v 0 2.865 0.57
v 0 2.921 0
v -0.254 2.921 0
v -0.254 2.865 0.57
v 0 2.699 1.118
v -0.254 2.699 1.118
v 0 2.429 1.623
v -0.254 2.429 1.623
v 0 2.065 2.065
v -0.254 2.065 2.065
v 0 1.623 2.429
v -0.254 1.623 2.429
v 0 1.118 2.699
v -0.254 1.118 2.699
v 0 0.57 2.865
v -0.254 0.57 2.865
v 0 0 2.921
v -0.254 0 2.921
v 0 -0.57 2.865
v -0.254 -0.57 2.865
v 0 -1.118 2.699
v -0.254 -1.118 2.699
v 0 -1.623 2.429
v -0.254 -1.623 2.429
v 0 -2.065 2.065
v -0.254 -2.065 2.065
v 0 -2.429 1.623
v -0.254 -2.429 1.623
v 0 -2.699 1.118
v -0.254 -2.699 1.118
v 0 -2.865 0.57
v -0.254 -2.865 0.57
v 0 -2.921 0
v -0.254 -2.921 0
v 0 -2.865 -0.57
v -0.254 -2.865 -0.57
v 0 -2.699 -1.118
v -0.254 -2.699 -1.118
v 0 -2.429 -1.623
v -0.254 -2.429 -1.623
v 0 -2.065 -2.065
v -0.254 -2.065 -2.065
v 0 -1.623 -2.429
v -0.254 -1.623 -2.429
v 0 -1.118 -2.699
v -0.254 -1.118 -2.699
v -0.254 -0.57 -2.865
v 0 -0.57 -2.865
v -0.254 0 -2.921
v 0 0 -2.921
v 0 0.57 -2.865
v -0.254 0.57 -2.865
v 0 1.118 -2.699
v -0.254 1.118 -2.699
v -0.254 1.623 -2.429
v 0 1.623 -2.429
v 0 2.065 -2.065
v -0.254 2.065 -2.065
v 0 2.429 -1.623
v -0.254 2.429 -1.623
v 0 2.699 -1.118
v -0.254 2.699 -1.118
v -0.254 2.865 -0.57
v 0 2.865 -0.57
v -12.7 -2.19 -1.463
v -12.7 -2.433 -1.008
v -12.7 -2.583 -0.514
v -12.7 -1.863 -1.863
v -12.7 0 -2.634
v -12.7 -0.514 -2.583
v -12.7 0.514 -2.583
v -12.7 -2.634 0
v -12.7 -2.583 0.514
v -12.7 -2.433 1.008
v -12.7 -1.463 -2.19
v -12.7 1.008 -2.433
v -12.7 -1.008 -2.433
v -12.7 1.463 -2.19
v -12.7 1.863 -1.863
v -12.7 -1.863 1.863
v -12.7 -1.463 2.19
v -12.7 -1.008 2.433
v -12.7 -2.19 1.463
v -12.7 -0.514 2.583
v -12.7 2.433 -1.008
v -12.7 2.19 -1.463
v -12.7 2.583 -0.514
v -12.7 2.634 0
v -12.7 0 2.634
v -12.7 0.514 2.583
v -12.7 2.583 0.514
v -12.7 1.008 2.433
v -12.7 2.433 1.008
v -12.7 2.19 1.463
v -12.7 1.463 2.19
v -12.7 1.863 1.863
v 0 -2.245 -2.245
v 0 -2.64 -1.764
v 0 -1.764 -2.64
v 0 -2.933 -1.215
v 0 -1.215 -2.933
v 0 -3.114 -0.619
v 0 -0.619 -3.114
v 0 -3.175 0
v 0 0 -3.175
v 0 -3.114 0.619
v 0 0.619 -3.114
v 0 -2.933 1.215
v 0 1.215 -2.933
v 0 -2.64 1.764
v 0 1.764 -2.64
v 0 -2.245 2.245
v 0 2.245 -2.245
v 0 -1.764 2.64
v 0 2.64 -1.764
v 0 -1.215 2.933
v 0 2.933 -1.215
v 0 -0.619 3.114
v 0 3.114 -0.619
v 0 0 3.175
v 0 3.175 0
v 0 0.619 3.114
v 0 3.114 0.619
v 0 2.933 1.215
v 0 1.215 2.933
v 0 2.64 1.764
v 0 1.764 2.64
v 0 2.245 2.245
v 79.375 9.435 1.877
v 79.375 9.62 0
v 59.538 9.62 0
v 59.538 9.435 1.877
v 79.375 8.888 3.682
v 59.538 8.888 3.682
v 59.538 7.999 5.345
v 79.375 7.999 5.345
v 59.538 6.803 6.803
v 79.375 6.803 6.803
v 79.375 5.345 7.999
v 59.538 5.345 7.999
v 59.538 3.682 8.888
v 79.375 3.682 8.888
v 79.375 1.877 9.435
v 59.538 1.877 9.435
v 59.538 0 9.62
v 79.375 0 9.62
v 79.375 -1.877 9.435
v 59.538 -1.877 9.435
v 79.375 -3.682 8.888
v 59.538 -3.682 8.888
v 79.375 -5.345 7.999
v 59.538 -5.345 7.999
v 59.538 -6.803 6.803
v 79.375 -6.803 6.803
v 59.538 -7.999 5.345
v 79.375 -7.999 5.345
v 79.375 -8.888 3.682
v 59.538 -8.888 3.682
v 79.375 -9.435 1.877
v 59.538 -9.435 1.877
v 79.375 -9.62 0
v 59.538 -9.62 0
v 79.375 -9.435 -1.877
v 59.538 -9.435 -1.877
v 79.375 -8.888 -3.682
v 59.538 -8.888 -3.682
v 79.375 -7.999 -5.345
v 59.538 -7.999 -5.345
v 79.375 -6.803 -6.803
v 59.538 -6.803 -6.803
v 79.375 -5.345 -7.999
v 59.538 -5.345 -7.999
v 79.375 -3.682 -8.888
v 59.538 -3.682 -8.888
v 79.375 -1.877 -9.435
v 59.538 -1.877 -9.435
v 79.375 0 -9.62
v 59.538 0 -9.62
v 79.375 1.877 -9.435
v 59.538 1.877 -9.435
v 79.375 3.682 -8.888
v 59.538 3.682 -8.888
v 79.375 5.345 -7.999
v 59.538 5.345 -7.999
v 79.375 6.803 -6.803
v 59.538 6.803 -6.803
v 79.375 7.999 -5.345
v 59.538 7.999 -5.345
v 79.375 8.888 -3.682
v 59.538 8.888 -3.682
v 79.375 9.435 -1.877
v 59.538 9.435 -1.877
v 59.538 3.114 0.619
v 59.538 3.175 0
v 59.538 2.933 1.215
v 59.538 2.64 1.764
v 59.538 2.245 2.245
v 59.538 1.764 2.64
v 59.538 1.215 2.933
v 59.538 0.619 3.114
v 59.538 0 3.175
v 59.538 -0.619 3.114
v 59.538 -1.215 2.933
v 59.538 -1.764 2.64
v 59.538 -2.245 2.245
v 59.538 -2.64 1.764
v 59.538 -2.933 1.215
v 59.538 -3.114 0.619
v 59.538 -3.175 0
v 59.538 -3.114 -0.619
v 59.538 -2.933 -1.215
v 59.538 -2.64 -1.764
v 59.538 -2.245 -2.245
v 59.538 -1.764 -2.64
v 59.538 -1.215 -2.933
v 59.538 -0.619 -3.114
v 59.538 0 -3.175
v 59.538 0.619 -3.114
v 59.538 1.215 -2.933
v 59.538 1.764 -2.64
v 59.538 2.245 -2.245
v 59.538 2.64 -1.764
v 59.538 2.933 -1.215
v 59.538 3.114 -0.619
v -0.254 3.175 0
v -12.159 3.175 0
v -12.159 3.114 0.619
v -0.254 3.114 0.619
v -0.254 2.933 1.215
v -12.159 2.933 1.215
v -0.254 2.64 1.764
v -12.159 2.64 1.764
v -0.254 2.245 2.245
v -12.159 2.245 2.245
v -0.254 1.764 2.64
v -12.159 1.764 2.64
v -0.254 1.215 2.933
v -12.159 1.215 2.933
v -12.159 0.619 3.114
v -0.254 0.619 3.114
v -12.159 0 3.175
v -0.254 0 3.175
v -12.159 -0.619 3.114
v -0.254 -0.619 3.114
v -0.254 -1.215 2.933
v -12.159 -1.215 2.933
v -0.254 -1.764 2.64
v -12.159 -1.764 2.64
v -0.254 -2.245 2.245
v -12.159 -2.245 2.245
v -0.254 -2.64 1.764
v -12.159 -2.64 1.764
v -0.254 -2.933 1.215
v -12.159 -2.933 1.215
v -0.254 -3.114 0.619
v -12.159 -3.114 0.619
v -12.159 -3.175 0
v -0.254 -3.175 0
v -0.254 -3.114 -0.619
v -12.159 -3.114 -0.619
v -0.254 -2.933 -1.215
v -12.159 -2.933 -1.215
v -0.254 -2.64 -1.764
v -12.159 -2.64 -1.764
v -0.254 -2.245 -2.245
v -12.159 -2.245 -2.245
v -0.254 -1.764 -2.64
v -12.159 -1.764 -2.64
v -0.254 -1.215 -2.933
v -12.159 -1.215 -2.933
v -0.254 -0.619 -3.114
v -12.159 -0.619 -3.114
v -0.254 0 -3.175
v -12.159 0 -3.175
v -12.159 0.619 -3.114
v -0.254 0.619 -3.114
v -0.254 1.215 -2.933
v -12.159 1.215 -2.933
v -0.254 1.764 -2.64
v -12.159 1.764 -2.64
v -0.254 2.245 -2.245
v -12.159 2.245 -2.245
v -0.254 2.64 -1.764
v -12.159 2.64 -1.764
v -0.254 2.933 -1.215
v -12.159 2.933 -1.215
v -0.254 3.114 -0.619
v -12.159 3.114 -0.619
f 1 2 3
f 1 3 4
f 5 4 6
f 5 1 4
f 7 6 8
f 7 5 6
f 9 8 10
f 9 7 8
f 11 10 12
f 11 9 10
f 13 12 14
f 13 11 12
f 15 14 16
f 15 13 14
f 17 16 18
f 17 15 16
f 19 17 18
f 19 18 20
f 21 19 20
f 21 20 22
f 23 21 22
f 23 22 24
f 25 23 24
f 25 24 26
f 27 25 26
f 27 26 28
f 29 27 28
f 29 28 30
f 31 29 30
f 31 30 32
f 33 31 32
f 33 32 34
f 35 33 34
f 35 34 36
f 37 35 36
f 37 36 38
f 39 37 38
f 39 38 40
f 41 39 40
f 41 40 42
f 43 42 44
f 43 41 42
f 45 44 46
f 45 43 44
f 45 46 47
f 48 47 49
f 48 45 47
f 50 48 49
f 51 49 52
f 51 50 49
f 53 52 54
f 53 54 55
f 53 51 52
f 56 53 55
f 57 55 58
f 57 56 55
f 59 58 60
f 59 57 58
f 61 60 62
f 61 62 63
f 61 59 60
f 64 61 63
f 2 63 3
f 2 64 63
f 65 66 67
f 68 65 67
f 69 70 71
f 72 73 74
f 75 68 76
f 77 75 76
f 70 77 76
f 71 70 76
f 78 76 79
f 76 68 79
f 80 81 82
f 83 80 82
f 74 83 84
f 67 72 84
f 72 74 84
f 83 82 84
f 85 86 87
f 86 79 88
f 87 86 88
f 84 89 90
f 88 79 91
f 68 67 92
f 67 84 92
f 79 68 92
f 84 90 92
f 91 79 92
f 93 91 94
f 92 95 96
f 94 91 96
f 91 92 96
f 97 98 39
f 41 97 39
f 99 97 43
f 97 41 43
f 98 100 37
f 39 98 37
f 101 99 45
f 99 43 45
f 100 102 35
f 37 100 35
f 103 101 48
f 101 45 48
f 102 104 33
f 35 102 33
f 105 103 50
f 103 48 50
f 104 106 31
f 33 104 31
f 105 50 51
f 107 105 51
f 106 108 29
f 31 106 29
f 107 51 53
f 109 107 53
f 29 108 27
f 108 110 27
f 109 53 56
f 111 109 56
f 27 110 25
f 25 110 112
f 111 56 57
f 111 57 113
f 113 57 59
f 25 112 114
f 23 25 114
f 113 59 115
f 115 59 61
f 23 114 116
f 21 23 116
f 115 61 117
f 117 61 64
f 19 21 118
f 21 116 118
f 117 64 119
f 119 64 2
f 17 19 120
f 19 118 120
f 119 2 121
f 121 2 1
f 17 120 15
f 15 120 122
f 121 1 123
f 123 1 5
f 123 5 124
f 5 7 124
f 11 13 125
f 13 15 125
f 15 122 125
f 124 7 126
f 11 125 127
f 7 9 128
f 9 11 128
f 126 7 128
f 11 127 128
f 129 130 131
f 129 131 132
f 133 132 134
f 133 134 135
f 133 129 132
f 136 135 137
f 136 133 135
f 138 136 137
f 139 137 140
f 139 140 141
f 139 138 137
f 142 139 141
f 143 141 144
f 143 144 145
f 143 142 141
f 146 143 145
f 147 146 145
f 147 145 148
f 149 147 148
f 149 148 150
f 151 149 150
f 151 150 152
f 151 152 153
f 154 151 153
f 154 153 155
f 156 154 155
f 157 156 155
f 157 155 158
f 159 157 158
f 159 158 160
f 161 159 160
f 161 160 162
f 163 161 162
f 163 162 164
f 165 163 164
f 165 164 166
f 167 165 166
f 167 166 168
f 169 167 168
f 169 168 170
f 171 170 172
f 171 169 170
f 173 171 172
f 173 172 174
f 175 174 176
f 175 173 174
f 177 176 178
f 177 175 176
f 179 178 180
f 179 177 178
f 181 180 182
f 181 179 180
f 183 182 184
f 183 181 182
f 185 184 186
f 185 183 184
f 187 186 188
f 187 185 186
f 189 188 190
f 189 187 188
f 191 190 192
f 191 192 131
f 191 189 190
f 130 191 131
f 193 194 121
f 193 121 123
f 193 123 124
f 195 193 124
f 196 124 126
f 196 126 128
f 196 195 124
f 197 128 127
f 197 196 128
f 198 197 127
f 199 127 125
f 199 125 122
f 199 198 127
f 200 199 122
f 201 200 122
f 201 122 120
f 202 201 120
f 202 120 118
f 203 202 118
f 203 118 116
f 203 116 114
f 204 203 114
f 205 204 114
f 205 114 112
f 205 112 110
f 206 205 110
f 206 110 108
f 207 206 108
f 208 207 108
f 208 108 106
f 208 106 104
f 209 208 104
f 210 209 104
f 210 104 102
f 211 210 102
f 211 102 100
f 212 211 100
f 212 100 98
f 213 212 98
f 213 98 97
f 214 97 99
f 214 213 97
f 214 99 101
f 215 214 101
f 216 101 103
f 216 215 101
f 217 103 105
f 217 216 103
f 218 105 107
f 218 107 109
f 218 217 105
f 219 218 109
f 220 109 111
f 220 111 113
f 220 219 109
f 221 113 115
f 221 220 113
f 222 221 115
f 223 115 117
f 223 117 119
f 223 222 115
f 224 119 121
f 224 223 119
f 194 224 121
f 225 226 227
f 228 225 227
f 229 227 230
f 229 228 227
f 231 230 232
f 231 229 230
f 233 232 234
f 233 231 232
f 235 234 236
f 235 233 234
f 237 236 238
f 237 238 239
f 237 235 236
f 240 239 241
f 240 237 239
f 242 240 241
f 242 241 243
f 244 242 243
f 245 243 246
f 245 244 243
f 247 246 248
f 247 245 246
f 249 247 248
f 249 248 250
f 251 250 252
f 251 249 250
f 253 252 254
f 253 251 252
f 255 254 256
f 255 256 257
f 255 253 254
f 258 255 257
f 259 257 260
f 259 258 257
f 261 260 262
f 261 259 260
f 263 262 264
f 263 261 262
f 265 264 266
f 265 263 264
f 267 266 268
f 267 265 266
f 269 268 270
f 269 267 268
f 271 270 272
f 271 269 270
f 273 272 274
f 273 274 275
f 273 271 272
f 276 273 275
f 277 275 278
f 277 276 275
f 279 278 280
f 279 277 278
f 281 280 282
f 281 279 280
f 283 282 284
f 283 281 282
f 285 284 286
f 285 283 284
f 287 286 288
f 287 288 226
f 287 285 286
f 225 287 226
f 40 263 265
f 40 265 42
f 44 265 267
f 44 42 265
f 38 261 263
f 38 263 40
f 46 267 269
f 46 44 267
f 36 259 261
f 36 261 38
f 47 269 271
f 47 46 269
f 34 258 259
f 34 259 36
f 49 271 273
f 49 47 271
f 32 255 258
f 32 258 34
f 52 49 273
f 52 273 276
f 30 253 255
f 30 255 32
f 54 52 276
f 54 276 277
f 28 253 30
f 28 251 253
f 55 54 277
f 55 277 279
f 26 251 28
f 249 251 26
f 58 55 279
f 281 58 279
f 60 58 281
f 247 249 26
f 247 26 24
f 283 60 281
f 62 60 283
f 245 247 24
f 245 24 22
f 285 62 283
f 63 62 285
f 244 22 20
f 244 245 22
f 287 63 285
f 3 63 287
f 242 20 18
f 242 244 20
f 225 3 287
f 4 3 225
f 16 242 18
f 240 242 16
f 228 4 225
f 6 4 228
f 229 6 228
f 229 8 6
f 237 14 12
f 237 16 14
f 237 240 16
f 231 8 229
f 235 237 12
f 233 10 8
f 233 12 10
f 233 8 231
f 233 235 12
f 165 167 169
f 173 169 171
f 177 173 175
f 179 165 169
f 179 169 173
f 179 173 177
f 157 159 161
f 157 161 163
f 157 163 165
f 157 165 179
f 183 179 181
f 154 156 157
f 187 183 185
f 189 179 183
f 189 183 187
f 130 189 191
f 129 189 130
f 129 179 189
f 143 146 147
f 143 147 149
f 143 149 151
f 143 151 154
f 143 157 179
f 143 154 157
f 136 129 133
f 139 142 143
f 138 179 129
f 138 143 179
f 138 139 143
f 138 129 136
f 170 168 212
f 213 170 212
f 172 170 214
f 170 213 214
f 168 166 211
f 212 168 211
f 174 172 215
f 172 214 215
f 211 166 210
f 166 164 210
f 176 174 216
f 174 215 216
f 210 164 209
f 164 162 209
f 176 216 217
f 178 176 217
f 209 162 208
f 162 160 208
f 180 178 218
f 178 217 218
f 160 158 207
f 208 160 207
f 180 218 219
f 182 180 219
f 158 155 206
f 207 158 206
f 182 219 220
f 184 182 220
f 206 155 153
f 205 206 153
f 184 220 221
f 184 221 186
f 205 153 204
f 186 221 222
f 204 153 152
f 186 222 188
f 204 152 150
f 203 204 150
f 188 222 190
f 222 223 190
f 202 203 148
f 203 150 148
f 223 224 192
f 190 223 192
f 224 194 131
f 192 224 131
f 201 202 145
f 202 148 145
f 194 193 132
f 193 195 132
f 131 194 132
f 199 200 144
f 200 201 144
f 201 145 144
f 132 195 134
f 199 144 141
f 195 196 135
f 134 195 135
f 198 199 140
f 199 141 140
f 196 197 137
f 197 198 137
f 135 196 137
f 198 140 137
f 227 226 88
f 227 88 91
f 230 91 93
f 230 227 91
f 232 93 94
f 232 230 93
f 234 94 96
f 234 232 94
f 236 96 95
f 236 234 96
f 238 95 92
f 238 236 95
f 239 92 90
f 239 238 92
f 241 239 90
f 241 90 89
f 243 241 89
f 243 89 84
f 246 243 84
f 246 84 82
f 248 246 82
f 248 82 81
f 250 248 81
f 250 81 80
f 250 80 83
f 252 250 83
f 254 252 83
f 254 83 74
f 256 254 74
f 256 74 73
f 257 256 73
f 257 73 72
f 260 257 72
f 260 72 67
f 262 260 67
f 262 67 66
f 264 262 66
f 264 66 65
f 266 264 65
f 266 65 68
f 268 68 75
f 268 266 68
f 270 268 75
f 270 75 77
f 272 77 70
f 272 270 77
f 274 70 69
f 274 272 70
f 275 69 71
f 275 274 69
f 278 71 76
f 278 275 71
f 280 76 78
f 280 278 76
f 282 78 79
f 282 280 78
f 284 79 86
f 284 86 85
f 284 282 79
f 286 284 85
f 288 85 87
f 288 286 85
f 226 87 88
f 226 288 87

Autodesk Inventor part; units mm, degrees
sketch "Sketch_1" plane through (0, 0, 0) normal (0, 0, 1) x (1, 0, 0)
  line L0 (79.375, 0) -> (0, 0)
  line L1 (0, 0) -> (0, 3.175)
  line L2 (0, 3.175) -> (59.5376, 3.175)
  line L3 (59.5376, 3.175) -> (59.5376, 9.6203)
  line L4 (59.5376, 9.6203) -> (79.375, 9.6203)
  line L5 (79.375, 9.6203) -> (79.375, 0)
  line L6 (79.375, 0) -> (0, 0)
revolve "Revolution1" add sketch "Sketch_1" angle 360 about axis through (79.375, 0, 0) along (1, 0, 0)
sketch "Sketch_3" plane through (0, 0, 0) normal (0, 0, 1) x (1, 0, 0)
  line L0 (0, 0) -> (-12.7, 0)
  line L1 (-12.7, 0) -> (-12.7, 2.634)
  line L2 (-12.7, 2.634) -> (-12.159, 3.175)
  line L3 (-12.159, 3.175) -> (0, 3.175)
  line L4 (0, 3.175) -> (0, 0)
  line L5 (0, 0) -> (-12.7, 0)
revolve "Revolution2" add sketch "Sketch_3" angle 360 about axis through (0, 0, 0) along (1, 0, 0)
thread "Thread1" size "1/4-28 UNF" class "2A" standard "ANSI Unified Screw Threads" length 12.159
sketch "Sketch_30" plane through (0, 0, 0) normal (0, 0, 1) x (1, 0, 0)
  line L0 (0, 0) -> (-0.254, 0)
  line L1 (-0.254, 2.921) -> (0, 2.921)
  line L2 (0, 2.921) -> (0, 3.429)
  line L3 (0, 3.429) -> (-0.254, 3.429)
  line L4 (-0.254, 3.429) -> (-0.254, 2.921)
revolve "Revolution3" cut sketch "Sketch_30" angle 360 about axis through (0, 0, 0) along (1, 0, 0)
ref_plane "dia1_XY" through (0, 3.175, 0) normal (1, 0, 0) x (0, 0, -1)
ref_plane "dia1_YZ" through (0, 3.175, 0) normal (0, 0, -1) x (0, 1, 0)
ref_plane "dia1_ZX" through (0, 3.175, 0) normal (0, 1, 0) x (1, 0, 0)
ref_plane "dia12_XY" through (0, 0, 10.9537) normal (1, 0, 0) x (0, 0, -1)
ref_plane "dia12_YZ" through (0, 0, 10.9537) normal (0, 0, -1) x (0, 1, 0)
ref_plane "dia12_ZX" through (0, 0, 10.9537) normal (0, 1, 0) x (1, 0, 0)
ref_plane "dia1r_XY" through (0, 0, 10.2235) normal (1, 0, 0) x (0, 0, -1)
ref_plane "dia1r_YZ" through (0, 0, 10.2235) normal (0, 0, -1) x (0, 1, 0)
ref_plane "dia1r_ZX" through (0, 0, 10.2235) normal (0, 1, 0) x (1, 0, 0)
ref_plane "dia2_XY" through (0, -3.175, 0) normal (1, 0, 0) x (0, 0, -1)
ref_plane "dia2_YZ" through (0, -3.175, 0) normal (0, 0, -1) x (0, 1, 0)
ref_plane "dia2_ZX" through (0, -3.175, 0) normal (0, 1, 0) x (1, 0, 0)
ref_plane "dia22_XY" through (0, 0, -10.9537) normal (1, 0, 0) x (0, 0, -1)
ref_plane "dia22_YZ" through (0, 0, -10.9537) normal (0, 0, -1) x (0, 1, 0)
ref_plane "dia22_ZX" through (0, 0, -10.9537) normal (0, 1, 0) x (1, 0, 0)
ref_plane "dia2r_XY" through (0, 0, -10.2235) normal (1, 0, 0) x (0, 0, -1)
ref_plane "dia2r_YZ" through (0, 0, -10.2235) normal (0, 0, -1) x (0, 1, 0)
ref_plane "dia2r_ZX" through (0, 0, -10.2235) normal (0, 1, 0) x (1, 0, 0)
ref_plane "rl1_XY" through (-12.7, 0, 0) normal (1, 0, 0) x (0, 0, -1)
ref_plane "rl1_YZ" through (-12.7, 0, 0) normal (0, 0, -1) x (0, 1, 0)
ref_plane "rl1_ZX" through (-12.7, 0, 0) normal (0, 1, 0) x (1, 0, 0)
ref_plane "rl2_XY" through (0, 0, 0) normal (1, 0, 0) x (0, 0, -1)
ref_plane "rl2_YZ" through (0, 0, 0) normal (0, 0, -1) x (0, 1, 0)
ref_plane "rl2_ZX" through (0, 0, 0) normal (0, 1, 0) x (1, 0, 0)
ref_plane "rod_cp_XY" through (0, 0, 0) normal (1, 0, 0) x (0, 0, -1)
ref_plane "rod_cp_YZ" through (0, 0, 0) normal (0, 0, -1) x (0, 1, 0)
ref_plane "rod_cp_ZX" through (0, 0, 0) normal (0, 1, 0) x (1, 0, 0)
ref_plane "stroke1_XY" through (0, 0, 0) normal (1, 0, 0) x (0, 0, -1)
ref_plane "stroke1_YZ" through (0, 0, 0) normal (0, 0, -1) x (0, 1, 0)
ref_plane "stroke1_ZX" through (0, 0, 0) normal (0, 1, 0) x (1, 0, 0)
ref_plane "thd1_XY" through (-12.7, 3.175, 0) normal (1, 0, 0) x (0, 0, -1)
ref_plane "thd1_YZ" through (-12.7, 3.175, 0) normal (0, 0, -1) x (0, 1, 0)
ref_plane "thd1_ZX" through (-12.7, 3.175, 0) normal (0, 1, 0) x (1, 0, 0)
ref_plane "thd2_XY" through (-12.7, -3.175, 0) normal (1, 0, 0) x (0, 0, -1)
ref_plane "thd2_YZ" through (-12.7, -3.175, 0) normal (0, 0, -1) x (0, 1, 0)
ref_plane "thd2_ZX" through (-12.7, -3.175, 0) normal (0, 1, 0) x (1, 0, 0)
ref_plane "to_rod_clevis_XY" through (-16.764, 0, 0) normal (1, 0, 0) x (0, 0, -1)
ref_plane "to_rod_clevis_YZ" through (-16.764, 0, 0) normal (0, 0, -1) x (0, 1, 0)
ref_plane "to_rod_clevis_ZX" through (-16.764, 0, 0) normal (0, 1, 0) x (1, 0, 0)
properties part number "C-040.75-R0000_rod"
